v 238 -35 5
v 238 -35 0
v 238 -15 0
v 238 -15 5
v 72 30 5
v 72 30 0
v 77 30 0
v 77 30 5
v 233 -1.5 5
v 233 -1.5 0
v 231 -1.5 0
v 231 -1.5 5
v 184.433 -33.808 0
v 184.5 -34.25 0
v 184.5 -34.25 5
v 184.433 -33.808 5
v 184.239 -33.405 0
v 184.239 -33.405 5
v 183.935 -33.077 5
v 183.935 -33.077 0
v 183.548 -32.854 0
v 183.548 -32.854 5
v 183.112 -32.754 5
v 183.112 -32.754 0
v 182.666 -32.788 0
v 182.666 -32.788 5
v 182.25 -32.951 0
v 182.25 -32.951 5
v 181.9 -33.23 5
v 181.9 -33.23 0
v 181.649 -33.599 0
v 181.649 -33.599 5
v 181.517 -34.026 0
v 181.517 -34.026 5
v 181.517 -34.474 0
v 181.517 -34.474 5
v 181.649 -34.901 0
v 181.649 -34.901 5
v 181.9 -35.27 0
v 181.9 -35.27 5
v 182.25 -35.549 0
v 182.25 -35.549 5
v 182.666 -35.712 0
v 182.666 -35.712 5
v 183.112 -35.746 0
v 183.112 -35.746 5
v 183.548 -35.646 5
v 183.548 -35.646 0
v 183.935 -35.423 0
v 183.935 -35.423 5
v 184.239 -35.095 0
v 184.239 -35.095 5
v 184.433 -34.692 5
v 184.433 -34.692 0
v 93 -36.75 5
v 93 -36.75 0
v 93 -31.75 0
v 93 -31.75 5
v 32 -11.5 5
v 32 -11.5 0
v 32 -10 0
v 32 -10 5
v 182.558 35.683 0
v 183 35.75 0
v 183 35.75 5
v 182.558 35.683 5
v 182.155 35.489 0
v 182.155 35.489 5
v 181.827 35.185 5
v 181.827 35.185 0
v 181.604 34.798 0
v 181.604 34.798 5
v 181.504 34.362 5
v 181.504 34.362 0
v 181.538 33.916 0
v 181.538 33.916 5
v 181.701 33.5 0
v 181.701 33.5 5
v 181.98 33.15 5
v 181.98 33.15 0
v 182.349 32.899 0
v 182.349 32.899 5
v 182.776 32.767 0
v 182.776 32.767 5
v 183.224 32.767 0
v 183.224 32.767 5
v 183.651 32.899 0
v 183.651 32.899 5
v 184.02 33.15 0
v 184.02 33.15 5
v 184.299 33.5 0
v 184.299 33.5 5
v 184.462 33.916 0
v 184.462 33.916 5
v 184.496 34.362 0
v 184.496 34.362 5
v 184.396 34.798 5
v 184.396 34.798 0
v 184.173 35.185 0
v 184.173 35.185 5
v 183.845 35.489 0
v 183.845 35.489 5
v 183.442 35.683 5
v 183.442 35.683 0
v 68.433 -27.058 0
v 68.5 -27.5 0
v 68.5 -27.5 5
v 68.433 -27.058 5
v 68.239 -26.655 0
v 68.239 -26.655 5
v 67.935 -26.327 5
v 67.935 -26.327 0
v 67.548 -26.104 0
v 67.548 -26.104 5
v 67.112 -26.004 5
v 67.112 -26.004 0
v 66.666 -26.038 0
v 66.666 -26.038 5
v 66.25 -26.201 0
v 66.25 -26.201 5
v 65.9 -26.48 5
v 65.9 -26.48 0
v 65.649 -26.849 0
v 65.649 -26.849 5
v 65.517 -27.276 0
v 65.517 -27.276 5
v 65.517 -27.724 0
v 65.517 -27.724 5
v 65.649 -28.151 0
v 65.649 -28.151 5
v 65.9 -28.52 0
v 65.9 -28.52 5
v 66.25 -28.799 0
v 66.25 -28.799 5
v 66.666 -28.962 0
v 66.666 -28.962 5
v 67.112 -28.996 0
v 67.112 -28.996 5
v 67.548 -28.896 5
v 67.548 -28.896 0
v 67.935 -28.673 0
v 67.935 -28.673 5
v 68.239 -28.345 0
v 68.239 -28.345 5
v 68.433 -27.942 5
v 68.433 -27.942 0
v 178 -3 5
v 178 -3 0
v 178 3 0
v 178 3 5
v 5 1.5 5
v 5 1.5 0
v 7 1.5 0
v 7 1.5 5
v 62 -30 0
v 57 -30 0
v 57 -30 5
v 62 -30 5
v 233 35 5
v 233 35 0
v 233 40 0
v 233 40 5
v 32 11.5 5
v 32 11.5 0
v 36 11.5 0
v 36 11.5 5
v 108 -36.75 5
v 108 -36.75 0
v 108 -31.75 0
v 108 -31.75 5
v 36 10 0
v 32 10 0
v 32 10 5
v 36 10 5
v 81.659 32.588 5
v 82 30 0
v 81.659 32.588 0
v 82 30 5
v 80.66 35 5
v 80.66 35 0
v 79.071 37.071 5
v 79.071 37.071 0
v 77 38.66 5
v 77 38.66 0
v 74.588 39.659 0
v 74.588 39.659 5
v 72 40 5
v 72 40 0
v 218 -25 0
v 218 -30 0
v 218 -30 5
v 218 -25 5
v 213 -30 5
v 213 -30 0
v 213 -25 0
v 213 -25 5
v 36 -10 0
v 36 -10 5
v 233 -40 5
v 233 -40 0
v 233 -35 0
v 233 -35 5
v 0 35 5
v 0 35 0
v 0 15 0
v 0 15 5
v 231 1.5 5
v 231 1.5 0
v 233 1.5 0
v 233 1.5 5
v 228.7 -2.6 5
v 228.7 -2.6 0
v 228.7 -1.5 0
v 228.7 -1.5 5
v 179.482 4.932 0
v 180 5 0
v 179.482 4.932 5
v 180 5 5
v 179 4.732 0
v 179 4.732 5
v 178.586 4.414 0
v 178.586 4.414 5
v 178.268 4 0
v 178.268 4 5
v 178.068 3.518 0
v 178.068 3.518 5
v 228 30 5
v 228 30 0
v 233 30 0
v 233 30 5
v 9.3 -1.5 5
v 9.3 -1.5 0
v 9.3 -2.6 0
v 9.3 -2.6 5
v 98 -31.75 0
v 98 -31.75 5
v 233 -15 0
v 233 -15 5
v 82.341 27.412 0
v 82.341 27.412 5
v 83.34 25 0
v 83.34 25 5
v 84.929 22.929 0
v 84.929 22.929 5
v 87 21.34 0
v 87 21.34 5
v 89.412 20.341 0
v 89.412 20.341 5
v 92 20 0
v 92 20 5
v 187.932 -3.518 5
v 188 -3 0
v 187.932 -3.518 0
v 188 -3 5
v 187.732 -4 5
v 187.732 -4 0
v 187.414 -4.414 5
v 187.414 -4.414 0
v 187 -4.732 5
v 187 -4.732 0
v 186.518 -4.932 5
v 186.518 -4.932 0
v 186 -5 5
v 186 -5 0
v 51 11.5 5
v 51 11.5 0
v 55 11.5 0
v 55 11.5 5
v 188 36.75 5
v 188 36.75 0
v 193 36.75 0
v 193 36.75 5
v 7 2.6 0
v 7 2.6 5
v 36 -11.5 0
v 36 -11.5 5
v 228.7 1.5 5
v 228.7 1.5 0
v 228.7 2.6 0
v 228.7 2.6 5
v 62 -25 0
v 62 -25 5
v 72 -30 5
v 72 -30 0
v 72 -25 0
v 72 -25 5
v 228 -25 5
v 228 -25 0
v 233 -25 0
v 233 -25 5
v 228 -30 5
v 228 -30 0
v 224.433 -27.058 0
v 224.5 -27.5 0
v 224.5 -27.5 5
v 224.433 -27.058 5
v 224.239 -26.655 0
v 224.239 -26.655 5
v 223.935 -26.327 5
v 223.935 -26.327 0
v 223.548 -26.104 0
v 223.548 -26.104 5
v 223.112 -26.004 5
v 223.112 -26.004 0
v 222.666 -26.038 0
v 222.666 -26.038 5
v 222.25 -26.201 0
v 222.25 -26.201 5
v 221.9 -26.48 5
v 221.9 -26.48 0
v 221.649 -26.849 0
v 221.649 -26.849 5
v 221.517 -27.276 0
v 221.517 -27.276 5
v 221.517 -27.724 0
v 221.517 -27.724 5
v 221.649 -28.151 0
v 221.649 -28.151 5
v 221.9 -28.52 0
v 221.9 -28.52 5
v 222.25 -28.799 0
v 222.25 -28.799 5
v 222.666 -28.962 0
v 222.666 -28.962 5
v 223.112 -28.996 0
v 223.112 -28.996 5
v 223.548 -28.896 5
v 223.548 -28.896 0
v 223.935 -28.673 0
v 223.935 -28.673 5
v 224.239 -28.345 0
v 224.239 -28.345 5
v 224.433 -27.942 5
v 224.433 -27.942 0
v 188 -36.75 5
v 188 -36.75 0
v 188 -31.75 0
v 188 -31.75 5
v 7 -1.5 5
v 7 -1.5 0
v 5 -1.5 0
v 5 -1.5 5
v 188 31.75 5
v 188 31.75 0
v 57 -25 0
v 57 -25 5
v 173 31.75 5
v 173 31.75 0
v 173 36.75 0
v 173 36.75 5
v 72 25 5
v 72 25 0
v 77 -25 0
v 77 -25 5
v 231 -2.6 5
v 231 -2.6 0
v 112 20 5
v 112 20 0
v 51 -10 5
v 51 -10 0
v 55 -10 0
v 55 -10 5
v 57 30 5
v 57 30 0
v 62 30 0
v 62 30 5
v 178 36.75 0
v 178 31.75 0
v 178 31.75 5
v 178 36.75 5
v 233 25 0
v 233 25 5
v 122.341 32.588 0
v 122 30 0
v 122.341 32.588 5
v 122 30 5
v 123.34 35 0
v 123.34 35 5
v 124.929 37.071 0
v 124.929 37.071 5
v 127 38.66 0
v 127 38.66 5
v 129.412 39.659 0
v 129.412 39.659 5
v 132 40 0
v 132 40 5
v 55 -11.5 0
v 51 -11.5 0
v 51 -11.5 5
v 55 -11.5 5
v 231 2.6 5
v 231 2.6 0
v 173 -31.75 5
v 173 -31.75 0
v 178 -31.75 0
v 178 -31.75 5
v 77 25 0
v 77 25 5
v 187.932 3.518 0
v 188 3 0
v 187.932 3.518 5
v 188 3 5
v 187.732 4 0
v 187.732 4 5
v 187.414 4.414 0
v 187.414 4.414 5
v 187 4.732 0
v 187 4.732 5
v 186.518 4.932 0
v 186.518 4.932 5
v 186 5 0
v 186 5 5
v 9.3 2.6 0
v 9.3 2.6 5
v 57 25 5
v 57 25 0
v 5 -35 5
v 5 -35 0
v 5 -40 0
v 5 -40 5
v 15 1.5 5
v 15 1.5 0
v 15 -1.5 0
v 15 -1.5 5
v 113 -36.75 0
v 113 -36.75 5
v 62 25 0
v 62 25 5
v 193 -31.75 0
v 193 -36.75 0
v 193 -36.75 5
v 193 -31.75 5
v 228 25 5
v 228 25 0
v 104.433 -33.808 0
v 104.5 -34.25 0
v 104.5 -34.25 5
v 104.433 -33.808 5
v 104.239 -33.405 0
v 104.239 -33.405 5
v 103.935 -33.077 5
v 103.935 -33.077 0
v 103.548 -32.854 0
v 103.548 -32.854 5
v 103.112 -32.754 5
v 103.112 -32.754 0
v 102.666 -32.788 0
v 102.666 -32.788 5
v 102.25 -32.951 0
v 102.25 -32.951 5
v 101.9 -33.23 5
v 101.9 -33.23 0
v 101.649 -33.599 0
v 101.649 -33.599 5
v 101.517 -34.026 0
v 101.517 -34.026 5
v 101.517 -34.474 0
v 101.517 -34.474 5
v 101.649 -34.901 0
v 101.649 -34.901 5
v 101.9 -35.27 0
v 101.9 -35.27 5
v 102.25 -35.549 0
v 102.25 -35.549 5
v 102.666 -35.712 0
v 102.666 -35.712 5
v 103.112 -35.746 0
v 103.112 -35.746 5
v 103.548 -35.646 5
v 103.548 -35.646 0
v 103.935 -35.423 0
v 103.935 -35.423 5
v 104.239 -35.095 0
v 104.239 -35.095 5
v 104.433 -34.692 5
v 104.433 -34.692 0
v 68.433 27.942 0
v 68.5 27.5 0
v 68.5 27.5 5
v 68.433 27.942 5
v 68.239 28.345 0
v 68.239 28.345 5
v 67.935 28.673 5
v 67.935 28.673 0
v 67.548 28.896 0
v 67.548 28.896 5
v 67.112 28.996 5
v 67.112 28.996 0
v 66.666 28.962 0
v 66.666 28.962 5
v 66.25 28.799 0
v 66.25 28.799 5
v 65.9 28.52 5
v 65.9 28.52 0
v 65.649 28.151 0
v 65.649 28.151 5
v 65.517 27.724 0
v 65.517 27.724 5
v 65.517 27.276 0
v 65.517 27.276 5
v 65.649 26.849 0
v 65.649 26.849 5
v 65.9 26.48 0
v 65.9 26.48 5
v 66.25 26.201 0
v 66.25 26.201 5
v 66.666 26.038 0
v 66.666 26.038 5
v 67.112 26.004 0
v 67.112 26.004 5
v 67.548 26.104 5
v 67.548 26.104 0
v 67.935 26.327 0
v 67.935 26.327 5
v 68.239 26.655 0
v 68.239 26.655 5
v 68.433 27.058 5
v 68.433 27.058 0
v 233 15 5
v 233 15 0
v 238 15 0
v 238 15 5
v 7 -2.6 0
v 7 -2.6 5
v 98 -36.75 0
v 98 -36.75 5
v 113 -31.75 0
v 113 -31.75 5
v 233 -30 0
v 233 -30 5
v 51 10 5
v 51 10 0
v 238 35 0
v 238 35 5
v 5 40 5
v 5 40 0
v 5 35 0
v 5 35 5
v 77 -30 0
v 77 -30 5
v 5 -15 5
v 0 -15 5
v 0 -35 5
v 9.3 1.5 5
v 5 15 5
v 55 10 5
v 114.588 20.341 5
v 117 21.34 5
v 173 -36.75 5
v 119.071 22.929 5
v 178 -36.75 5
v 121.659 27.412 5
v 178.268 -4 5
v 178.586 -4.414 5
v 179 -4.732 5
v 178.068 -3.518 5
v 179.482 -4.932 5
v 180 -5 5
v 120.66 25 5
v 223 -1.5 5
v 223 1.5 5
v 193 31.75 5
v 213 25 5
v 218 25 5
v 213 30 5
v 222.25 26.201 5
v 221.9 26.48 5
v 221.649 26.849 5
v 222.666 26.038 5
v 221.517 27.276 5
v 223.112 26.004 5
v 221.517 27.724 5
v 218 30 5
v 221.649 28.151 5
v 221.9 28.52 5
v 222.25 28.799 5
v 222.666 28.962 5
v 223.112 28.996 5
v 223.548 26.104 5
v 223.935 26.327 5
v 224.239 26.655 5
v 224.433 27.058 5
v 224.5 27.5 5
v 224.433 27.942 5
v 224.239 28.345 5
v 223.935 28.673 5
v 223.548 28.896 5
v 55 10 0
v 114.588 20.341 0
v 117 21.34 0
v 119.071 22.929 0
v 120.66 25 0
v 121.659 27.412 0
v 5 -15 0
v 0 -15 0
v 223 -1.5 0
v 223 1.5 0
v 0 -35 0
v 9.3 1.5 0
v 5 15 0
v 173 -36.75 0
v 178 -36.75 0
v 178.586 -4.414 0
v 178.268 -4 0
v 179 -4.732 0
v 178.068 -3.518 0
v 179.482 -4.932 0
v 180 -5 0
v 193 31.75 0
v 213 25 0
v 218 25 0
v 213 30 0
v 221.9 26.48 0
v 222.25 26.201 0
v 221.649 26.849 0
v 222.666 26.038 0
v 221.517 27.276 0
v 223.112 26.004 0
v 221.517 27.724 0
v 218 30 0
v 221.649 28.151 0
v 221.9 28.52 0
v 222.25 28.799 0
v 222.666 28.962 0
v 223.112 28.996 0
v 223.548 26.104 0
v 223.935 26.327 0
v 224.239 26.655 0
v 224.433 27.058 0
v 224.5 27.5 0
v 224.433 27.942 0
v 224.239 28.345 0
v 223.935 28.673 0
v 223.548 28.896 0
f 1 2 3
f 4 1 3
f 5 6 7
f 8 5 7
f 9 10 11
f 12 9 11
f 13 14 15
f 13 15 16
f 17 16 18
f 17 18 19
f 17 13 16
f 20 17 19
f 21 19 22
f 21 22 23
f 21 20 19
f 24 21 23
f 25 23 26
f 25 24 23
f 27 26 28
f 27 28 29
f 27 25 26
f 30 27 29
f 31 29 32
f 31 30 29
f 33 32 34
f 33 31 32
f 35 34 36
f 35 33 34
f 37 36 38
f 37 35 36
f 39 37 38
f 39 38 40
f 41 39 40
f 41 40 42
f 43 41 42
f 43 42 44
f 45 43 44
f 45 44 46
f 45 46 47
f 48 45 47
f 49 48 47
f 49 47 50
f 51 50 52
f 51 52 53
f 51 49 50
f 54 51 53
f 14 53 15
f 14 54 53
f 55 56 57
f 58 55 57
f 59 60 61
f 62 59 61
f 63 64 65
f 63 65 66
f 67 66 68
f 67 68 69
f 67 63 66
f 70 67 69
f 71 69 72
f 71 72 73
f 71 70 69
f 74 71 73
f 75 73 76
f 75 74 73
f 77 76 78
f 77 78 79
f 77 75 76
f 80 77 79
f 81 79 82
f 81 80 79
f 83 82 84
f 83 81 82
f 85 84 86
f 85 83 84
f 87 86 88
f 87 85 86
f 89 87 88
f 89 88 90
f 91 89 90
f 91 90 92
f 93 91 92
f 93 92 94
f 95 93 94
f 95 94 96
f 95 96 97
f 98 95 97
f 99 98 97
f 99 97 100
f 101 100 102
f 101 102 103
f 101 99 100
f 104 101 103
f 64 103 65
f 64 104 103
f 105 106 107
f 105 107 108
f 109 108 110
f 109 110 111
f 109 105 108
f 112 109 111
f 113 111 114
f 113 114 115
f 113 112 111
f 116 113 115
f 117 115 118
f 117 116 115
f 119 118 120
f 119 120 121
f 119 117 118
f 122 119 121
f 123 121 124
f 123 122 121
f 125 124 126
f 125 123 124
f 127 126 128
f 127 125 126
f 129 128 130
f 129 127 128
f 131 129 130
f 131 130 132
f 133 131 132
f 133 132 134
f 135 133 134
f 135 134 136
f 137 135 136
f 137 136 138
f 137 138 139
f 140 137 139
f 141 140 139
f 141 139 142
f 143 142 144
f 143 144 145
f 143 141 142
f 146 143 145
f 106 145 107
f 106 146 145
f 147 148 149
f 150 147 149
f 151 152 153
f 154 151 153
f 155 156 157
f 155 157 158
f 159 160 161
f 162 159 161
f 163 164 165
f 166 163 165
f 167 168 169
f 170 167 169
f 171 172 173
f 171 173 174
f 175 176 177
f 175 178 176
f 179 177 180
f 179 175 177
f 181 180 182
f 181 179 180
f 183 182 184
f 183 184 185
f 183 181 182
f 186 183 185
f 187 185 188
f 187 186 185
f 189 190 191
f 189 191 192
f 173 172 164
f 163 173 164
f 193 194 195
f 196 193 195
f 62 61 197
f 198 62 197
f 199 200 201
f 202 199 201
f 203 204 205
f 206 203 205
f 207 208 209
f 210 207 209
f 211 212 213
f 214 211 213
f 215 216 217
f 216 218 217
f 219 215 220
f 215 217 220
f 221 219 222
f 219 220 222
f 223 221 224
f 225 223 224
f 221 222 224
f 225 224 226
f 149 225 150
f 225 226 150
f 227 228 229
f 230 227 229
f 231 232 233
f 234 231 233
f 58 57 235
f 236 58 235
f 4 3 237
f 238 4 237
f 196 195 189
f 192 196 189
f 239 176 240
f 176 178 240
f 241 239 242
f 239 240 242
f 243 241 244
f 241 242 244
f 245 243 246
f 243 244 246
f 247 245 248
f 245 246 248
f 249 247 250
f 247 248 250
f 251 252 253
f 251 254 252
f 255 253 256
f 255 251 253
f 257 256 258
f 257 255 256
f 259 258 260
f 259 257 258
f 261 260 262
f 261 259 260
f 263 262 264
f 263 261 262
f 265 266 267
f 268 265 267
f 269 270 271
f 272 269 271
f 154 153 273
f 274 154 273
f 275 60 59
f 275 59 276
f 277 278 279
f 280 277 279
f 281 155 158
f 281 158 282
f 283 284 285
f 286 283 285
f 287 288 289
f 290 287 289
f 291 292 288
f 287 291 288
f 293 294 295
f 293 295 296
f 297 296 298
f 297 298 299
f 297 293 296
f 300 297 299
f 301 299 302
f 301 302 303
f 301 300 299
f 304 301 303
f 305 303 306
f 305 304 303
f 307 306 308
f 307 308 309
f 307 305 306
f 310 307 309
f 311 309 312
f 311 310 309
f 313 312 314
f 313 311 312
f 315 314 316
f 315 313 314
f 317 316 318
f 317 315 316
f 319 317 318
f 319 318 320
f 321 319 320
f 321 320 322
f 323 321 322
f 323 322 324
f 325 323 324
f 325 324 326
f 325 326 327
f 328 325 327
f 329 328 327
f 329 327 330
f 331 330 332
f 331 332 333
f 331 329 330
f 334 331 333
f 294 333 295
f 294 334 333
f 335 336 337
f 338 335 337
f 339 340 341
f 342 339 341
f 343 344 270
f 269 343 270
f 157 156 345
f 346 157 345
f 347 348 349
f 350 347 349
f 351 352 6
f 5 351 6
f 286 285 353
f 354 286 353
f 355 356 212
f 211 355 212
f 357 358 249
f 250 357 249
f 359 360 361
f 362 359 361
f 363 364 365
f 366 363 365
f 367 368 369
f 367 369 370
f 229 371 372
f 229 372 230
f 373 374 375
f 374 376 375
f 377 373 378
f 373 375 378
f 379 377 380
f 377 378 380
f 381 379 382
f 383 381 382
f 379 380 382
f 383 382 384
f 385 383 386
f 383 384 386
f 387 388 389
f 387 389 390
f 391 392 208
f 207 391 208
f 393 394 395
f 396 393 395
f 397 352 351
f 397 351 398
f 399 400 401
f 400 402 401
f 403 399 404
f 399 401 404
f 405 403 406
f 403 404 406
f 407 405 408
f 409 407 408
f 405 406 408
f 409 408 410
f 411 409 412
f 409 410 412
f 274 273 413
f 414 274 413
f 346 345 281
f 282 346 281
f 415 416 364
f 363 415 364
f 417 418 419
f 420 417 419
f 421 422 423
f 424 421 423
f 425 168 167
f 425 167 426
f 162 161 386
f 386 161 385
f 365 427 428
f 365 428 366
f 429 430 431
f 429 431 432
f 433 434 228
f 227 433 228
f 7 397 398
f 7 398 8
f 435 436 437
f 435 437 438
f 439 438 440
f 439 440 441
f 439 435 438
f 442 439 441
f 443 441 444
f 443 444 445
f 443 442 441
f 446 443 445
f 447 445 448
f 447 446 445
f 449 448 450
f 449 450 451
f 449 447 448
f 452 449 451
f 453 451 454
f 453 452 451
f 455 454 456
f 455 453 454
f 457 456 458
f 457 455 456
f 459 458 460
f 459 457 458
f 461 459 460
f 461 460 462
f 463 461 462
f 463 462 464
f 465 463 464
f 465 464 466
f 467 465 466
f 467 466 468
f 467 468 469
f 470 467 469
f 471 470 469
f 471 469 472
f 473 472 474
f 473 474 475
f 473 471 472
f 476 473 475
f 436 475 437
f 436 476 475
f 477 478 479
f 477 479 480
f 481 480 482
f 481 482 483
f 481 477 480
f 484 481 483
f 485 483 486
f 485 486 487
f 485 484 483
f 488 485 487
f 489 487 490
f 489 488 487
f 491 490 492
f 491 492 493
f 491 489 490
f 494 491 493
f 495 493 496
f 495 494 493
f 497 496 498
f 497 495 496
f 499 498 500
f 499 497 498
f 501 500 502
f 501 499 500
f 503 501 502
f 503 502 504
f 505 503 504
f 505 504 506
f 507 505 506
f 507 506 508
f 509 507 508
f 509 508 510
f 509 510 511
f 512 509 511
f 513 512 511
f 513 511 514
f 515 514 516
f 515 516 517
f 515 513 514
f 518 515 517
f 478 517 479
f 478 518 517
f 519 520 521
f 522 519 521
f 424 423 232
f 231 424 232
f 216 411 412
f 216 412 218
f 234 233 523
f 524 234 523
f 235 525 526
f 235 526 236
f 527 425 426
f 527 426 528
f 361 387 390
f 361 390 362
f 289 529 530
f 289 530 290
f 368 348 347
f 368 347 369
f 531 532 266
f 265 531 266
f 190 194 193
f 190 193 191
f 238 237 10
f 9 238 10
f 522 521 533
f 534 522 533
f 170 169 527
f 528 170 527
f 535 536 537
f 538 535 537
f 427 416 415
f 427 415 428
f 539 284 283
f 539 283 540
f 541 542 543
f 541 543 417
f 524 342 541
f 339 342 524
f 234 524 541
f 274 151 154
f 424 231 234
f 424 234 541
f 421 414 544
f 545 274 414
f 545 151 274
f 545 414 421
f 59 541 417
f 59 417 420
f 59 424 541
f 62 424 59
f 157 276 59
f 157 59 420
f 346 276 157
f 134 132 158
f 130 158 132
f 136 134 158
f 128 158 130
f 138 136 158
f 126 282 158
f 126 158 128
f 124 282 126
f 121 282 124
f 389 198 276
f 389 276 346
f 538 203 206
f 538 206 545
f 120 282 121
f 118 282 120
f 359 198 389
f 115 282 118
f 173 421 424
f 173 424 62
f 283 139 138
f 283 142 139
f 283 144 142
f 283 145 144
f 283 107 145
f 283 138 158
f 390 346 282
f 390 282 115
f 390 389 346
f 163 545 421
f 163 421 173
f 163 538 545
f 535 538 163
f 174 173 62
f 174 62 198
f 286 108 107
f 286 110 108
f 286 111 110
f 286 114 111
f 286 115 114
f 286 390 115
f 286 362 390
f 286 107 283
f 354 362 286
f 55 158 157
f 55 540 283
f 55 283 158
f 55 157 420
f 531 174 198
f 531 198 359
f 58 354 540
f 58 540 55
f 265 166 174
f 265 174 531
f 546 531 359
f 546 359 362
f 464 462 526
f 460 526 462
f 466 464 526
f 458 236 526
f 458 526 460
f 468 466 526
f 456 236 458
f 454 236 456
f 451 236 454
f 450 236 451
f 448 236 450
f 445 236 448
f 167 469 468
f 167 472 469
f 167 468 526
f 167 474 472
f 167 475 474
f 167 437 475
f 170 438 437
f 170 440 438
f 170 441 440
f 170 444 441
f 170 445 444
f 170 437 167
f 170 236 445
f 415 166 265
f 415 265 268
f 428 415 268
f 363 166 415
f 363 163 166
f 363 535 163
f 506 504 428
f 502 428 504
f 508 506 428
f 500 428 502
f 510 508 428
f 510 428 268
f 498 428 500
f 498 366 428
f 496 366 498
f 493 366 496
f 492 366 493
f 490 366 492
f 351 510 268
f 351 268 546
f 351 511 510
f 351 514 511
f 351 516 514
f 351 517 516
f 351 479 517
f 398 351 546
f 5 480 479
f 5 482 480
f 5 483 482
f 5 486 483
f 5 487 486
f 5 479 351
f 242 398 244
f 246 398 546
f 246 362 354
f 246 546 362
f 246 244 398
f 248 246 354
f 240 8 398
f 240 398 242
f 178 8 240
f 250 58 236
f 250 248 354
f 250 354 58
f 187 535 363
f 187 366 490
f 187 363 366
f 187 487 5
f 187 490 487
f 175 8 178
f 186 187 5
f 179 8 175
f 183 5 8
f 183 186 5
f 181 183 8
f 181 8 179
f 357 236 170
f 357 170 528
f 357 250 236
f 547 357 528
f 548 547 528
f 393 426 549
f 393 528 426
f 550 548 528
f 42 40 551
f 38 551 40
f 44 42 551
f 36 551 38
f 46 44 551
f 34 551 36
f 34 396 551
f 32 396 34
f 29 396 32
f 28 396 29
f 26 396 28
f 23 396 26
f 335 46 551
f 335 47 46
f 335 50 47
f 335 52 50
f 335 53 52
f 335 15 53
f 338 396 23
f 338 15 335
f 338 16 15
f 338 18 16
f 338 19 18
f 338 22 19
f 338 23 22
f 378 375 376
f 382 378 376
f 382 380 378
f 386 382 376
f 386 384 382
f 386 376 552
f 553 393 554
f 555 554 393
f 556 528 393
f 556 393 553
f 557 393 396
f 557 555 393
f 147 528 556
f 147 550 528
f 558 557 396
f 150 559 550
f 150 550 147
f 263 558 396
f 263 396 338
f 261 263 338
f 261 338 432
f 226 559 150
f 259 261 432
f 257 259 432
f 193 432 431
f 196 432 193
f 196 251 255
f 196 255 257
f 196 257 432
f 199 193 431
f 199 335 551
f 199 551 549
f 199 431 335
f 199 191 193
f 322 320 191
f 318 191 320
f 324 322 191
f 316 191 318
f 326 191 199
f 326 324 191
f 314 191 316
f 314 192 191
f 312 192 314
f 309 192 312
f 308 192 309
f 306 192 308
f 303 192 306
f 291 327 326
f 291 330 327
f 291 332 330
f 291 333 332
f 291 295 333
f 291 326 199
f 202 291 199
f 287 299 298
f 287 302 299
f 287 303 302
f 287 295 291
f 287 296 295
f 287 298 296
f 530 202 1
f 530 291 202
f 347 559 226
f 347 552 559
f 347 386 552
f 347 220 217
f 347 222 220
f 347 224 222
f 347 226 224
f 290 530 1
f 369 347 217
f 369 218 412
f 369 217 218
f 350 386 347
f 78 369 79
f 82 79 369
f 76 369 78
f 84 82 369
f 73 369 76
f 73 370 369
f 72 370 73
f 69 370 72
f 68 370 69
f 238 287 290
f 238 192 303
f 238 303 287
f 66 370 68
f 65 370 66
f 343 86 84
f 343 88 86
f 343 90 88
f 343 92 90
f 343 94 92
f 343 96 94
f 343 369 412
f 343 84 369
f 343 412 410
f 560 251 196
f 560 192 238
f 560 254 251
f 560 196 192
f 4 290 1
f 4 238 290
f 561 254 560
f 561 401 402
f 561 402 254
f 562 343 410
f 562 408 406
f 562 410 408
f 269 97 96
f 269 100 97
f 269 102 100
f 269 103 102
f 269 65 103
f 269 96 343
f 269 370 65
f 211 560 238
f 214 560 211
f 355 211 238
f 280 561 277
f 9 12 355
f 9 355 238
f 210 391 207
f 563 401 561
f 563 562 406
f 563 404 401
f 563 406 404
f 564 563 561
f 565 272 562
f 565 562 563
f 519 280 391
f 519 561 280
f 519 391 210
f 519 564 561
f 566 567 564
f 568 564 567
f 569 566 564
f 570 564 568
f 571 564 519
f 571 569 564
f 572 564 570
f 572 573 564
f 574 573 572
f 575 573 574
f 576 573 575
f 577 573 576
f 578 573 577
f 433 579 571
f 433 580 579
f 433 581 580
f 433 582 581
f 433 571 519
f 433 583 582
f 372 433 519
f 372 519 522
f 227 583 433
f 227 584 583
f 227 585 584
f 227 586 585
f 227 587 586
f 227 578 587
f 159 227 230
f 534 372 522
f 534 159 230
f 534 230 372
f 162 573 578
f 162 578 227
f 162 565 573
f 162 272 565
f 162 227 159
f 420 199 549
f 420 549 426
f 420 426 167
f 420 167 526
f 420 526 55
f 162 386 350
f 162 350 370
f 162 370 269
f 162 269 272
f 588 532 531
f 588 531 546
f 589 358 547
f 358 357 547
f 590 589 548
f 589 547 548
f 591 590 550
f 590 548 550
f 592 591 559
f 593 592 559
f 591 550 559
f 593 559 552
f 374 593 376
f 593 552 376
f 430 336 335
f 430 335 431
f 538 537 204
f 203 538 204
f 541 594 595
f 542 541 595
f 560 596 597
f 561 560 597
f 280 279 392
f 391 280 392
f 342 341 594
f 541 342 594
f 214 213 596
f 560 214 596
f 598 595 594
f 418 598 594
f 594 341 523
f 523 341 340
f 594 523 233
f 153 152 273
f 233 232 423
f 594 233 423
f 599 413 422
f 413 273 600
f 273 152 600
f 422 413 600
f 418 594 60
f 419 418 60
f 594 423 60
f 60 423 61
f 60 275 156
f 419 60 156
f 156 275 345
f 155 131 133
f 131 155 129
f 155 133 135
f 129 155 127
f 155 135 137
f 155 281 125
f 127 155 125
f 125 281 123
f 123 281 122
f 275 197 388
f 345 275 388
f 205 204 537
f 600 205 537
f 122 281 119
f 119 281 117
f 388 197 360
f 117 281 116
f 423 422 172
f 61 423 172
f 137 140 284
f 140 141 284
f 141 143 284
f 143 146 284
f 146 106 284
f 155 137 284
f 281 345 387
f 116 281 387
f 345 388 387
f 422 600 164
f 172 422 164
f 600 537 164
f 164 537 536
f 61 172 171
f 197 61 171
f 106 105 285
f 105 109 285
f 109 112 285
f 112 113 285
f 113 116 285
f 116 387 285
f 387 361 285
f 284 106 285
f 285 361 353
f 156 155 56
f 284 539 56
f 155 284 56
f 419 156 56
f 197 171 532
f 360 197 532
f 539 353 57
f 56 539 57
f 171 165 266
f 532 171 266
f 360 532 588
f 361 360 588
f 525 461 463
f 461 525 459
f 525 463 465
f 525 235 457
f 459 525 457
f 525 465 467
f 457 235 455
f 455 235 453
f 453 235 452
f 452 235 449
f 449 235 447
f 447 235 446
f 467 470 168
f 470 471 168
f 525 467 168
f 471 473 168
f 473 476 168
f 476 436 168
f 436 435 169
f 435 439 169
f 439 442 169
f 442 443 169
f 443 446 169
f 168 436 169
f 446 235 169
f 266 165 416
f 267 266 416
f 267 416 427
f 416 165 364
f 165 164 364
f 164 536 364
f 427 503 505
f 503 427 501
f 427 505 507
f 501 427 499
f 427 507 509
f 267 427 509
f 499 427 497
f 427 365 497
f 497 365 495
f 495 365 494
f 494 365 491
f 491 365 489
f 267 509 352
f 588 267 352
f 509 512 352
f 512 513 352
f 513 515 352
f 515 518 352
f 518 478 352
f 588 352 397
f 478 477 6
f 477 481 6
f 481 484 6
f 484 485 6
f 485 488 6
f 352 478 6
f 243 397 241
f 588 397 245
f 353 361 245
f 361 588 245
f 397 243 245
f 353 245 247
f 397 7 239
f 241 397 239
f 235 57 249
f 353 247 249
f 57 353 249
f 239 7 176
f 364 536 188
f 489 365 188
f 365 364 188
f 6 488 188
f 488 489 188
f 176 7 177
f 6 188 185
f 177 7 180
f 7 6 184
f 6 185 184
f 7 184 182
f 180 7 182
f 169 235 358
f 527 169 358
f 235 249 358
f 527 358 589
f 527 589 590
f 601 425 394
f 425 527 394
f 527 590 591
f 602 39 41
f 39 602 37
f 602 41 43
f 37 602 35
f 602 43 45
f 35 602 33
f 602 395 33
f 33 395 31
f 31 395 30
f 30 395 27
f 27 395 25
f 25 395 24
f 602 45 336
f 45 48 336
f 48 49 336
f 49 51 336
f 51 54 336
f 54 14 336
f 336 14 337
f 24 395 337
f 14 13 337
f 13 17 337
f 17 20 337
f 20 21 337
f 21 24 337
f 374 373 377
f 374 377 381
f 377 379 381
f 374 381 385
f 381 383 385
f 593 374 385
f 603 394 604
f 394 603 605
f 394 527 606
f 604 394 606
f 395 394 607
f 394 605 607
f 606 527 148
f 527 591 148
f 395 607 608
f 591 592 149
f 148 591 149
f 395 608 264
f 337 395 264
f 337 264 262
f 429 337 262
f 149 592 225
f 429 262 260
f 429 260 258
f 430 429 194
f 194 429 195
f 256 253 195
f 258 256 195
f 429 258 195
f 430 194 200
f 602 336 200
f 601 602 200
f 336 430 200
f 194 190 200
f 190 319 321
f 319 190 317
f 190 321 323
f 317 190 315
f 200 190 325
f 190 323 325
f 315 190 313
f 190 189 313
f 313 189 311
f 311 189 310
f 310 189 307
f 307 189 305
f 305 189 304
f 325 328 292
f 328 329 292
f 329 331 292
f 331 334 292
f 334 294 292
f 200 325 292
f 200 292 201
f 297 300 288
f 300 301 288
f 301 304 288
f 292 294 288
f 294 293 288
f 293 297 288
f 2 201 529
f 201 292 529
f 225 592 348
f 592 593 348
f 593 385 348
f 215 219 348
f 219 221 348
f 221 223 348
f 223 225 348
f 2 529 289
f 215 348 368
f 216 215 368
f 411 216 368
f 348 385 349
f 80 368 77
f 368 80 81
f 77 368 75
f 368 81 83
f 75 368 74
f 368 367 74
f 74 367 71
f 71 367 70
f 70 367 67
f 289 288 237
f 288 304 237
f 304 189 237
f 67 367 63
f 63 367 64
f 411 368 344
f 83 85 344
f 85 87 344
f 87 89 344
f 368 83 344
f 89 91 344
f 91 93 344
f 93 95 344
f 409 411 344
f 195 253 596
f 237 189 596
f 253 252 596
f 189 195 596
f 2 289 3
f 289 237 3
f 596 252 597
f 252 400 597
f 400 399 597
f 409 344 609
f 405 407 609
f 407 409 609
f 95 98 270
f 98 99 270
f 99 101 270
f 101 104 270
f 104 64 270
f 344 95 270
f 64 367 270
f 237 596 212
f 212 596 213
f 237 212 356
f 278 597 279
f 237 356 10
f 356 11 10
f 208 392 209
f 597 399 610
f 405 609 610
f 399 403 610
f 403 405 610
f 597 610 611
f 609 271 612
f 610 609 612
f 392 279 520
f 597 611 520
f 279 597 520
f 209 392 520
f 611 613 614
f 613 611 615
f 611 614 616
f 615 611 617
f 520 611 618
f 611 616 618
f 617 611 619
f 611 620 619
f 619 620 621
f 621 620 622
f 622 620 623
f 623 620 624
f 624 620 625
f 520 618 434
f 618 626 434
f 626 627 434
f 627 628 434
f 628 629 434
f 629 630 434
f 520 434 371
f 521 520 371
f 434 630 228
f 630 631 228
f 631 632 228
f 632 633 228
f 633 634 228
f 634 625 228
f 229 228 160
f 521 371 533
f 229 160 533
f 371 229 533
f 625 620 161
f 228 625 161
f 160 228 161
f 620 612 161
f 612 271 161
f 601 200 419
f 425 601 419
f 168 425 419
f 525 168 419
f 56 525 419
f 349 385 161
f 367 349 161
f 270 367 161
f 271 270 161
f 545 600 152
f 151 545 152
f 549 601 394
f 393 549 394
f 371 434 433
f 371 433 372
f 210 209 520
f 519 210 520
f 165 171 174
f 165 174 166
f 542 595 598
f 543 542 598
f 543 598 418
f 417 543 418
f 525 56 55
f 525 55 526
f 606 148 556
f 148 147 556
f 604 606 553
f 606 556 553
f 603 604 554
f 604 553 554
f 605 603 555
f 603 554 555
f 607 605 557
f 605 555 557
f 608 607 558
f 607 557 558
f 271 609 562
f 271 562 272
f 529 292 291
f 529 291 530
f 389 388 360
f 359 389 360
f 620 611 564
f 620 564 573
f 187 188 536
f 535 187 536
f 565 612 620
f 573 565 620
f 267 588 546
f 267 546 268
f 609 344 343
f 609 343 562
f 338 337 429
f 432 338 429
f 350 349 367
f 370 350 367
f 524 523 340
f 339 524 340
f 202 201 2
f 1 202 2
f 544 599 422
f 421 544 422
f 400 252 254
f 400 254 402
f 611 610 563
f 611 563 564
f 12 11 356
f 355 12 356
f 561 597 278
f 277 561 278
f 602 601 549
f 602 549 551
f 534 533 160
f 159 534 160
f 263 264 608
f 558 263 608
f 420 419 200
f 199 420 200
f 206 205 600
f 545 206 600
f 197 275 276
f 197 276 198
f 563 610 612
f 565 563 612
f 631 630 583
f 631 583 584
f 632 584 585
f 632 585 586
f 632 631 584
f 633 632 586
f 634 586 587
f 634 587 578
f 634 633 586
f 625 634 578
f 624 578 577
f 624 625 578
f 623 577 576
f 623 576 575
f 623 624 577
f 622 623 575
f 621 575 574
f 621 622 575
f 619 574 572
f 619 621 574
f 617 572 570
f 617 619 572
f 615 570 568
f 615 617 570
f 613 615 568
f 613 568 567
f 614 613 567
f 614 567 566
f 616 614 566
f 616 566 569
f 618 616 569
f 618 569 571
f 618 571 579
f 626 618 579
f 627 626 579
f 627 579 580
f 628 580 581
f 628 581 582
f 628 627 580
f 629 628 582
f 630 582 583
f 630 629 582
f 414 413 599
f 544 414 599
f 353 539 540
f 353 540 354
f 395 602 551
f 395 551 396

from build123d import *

# Parameters (mm, degrees)
ESQUISSE1_R        = 1.5
ESQUISSE1_W        = 4
ESQUISSE1_H        = 1.5
ESQUISSE1_W_2      = 5
ESQUISSE1_H_2      = 5
BOSS_EXTRU_1_DEPTH = 5
SKETCH1_W          = 40
SKETCH1_H          = 20
SKETCH1_W_2        = 10
SKETCH1_H_2        = 10
CUT_EXTRUDE1_DEPTH = 10
FILLET2_R          = 10
FILLET3_R          = 2


with BuildPart() as part:
    # Esquisse1 → Boss.-Extru.1 (new body)
    with BuildSketch(Plane.XY):
        Polygon((0, 35), (0, 15), (5, 15), (5, 1.5), (7, 1.5), (7, 2.6), (9.3, 2.6), (9.3, 1.5), (15, 1.5), (15, -1.5), (9.3, -1.5), (9.3, -2.6), (7, -2.6), (7, -1.5), (5, -1.5), (5, -15), (0, -15), (0, -35), (5, -35), (5, -40), (233, -40), (233, -35), (238, -35), (238, -15), (233, -15), (233, -1.5), (231, -1.5), (231, -2.6), (228.7, -2.6), (228.7, -1.5), (223, -1.5), (223, 1.5), (228.7, 1.5), (228.7, 2.6), (231, 2.6), (231, 1.5), (233, 1.5), (233, 15), (238, 15), (238, 35), (233, 35), (233, 40), (5, 40), (5, 35), align=None)
        with Locations((223, 27.5)):
            Circle(ESQUISSE1_R, mode=Mode.SUBTRACT)
        with Locations((223, -27.5)):
            Circle(ESQUISSE1_R, mode=Mode.SUBTRACT)
        with Locations((67, -27.5)):
            Circle(ESQUISSE1_R, mode=Mode.SUBTRACT)
        with Locations((67, 27.5)):
            Circle(ESQUISSE1_R, mode=Mode.SUBTRACT)
        with Locations((183, -34.25)):
            Circle(ESQUISSE1_R, mode=Mode.SUBTRACT)
        with Locations(Location((183, 34.25, 0), (0, 0, 90))):
            Circle(ESQUISSE1_R, mode=Mode.SUBTRACT)
        with Locations(Location((103, 34.25, 0), (0, 0, 90))):
            Circle(ESQUISSE1_R, mode=Mode.SUBTRACT)
        with Locations((103, -34.25)):
            Circle(ESQUISSE1_R, mode=Mode.SUBTRACT)
        with Locations((34, -10.75)):
            Rectangle(ESQUISSE1_W, ESQUISSE1_H, mode=Mode.SUBTRACT)
        with Locations((34, 10.75)):
            Rectangle(ESQUISSE1_W, ESQUISSE1_H, mode=Mode.SUBTRACT)
        with Locations((53, 10.75)):
            Rectangle(ESQUISSE1_W, ESQUISSE1_H, mode=Mode.SUBTRACT)
        with Locations((53, -10.75)):
            Rectangle(ESQUISSE1_W, ESQUISSE1_H, mode=Mode.SUBTRACT)
        with Locations((215.5, 27.5)):
            Rectangle(ESQUISSE1_W_2, ESQUISSE1_H_2, mode=Mode.SUBTRACT)
        with Locations((230.5, 27.5)):
            Rectangle(ESQUISSE1_W_2, ESQUISSE1_H_2, mode=Mode.SUBTRACT)
        with Locations((215.5, -27.5)):
            Rectangle(ESQUISSE1_W_2, ESQUISSE1_H_2, mode=Mode.SUBTRACT)
        with Locations((230.5, -27.5)):
            Rectangle(ESQUISSE1_W_2, ESQUISSE1_H_2, mode=Mode.SUBTRACT)
        with Locations((59.5, -27.5)):
            Rectangle(ESQUISSE1_W_2, ESQUISSE1_H_2, mode=Mode.SUBTRACT)
        with Locations((74.5, -27.5)):
            Rectangle(ESQUISSE1_W_2, ESQUISSE1_H_2, mode=Mode.SUBTRACT)
        with Locations((59.5, 27.5)):
            Rectangle(ESQUISSE1_W_2, ESQUISSE1_H_2, mode=Mode.SUBTRACT)
        with Locations((74.5, 27.5)):
            Rectangle(ESQUISSE1_W_2, ESQUISSE1_H_2, mode=Mode.SUBTRACT)
        with Locations((175.5, -34.25)):
            Rectangle(ESQUISSE1_W_2, ESQUISSE1_H_2, mode=Mode.SUBTRACT)
        with Locations((190.5, -34.25)):
            Rectangle(ESQUISSE1_W_2, ESQUISSE1_H_2, mode=Mode.SUBTRACT)
        with Locations((175.5, 34.25)):
            Rectangle(ESQUISSE1_W_2, ESQUISSE1_H_2, mode=Mode.SUBTRACT)
        with Locations((190.5, 34.25)):
            Rectangle(ESQUISSE1_W_2, ESQUISSE1_H_2, mode=Mode.SUBTRACT)
        with Locations((95.5, 34.25)):
            Rectangle(ESQUISSE1_W_2, ESQUISSE1_H_2, mode=Mode.SUBTRACT)
        with Locations((110.5, 34.25)):
            Rectangle(ESQUISSE1_W_2, ESQUISSE1_H_2, mode=Mode.SUBTRACT)
        with Locations((95.5, -34.25)):
            Rectangle(ESQUISSE1_W_2, ESQUISSE1_H_2, mode=Mode.SUBTRACT)
        with Locations((110.5, -34.25)):
            Rectangle(ESQUISSE1_W_2, ESQUISSE1_H_2, mode=Mode.SUBTRACT)
    extrude(amount=BOSS_EXTRU_1_DEPTH)

    # Sketch1 → Cut-Extrude1 (cut)
    with BuildSketch(Plane(origin=(0, 0, 0), x_dir=(-1, 0, 0), z_dir=(0, 0, -1))):
        with Locations((-102, 30)):
            Rectangle(SKETCH1_W, SKETCH1_H)
        with Locations((-183, 0)):
            Rectangle(SKETCH1_W_2, SKETCH1_H_2)
    extrude(amount=-CUT_EXTRUDE1_DEPTH, mode=Mode.SUBTRACT)

    # Fillet2
    fillet2_edges = [part.edges().sort_by_distance(p)[0] for p in [
        (122, 20, 2.5),
        (82, 20, 2.5),
    ]]
    fillet(fillet2_edges, radius=FILLET2_R)
    fillet2_2_edges = [part.edges().sort_by_distance(p)[0] for p in [
        (122, 40, 2.5),
        (82, 40, 2.5),
    ]]
    fillet(fillet2_2_edges, radius=FILLET2_R - 0.0001)  # a hair under: the kernel refuses the full size

    # Fillet3
    fillet3_edges = [part.edges().sort_by_distance(p)[0] for p in [
        (188, -5, 2.5),
        (188, 5, 2.5),
        (178, 5, 2.5),
        (178, -5, 2.5),
    ]]
    fillet(fillet3_edges, radius=FILLET3_R)


solid = part.part
